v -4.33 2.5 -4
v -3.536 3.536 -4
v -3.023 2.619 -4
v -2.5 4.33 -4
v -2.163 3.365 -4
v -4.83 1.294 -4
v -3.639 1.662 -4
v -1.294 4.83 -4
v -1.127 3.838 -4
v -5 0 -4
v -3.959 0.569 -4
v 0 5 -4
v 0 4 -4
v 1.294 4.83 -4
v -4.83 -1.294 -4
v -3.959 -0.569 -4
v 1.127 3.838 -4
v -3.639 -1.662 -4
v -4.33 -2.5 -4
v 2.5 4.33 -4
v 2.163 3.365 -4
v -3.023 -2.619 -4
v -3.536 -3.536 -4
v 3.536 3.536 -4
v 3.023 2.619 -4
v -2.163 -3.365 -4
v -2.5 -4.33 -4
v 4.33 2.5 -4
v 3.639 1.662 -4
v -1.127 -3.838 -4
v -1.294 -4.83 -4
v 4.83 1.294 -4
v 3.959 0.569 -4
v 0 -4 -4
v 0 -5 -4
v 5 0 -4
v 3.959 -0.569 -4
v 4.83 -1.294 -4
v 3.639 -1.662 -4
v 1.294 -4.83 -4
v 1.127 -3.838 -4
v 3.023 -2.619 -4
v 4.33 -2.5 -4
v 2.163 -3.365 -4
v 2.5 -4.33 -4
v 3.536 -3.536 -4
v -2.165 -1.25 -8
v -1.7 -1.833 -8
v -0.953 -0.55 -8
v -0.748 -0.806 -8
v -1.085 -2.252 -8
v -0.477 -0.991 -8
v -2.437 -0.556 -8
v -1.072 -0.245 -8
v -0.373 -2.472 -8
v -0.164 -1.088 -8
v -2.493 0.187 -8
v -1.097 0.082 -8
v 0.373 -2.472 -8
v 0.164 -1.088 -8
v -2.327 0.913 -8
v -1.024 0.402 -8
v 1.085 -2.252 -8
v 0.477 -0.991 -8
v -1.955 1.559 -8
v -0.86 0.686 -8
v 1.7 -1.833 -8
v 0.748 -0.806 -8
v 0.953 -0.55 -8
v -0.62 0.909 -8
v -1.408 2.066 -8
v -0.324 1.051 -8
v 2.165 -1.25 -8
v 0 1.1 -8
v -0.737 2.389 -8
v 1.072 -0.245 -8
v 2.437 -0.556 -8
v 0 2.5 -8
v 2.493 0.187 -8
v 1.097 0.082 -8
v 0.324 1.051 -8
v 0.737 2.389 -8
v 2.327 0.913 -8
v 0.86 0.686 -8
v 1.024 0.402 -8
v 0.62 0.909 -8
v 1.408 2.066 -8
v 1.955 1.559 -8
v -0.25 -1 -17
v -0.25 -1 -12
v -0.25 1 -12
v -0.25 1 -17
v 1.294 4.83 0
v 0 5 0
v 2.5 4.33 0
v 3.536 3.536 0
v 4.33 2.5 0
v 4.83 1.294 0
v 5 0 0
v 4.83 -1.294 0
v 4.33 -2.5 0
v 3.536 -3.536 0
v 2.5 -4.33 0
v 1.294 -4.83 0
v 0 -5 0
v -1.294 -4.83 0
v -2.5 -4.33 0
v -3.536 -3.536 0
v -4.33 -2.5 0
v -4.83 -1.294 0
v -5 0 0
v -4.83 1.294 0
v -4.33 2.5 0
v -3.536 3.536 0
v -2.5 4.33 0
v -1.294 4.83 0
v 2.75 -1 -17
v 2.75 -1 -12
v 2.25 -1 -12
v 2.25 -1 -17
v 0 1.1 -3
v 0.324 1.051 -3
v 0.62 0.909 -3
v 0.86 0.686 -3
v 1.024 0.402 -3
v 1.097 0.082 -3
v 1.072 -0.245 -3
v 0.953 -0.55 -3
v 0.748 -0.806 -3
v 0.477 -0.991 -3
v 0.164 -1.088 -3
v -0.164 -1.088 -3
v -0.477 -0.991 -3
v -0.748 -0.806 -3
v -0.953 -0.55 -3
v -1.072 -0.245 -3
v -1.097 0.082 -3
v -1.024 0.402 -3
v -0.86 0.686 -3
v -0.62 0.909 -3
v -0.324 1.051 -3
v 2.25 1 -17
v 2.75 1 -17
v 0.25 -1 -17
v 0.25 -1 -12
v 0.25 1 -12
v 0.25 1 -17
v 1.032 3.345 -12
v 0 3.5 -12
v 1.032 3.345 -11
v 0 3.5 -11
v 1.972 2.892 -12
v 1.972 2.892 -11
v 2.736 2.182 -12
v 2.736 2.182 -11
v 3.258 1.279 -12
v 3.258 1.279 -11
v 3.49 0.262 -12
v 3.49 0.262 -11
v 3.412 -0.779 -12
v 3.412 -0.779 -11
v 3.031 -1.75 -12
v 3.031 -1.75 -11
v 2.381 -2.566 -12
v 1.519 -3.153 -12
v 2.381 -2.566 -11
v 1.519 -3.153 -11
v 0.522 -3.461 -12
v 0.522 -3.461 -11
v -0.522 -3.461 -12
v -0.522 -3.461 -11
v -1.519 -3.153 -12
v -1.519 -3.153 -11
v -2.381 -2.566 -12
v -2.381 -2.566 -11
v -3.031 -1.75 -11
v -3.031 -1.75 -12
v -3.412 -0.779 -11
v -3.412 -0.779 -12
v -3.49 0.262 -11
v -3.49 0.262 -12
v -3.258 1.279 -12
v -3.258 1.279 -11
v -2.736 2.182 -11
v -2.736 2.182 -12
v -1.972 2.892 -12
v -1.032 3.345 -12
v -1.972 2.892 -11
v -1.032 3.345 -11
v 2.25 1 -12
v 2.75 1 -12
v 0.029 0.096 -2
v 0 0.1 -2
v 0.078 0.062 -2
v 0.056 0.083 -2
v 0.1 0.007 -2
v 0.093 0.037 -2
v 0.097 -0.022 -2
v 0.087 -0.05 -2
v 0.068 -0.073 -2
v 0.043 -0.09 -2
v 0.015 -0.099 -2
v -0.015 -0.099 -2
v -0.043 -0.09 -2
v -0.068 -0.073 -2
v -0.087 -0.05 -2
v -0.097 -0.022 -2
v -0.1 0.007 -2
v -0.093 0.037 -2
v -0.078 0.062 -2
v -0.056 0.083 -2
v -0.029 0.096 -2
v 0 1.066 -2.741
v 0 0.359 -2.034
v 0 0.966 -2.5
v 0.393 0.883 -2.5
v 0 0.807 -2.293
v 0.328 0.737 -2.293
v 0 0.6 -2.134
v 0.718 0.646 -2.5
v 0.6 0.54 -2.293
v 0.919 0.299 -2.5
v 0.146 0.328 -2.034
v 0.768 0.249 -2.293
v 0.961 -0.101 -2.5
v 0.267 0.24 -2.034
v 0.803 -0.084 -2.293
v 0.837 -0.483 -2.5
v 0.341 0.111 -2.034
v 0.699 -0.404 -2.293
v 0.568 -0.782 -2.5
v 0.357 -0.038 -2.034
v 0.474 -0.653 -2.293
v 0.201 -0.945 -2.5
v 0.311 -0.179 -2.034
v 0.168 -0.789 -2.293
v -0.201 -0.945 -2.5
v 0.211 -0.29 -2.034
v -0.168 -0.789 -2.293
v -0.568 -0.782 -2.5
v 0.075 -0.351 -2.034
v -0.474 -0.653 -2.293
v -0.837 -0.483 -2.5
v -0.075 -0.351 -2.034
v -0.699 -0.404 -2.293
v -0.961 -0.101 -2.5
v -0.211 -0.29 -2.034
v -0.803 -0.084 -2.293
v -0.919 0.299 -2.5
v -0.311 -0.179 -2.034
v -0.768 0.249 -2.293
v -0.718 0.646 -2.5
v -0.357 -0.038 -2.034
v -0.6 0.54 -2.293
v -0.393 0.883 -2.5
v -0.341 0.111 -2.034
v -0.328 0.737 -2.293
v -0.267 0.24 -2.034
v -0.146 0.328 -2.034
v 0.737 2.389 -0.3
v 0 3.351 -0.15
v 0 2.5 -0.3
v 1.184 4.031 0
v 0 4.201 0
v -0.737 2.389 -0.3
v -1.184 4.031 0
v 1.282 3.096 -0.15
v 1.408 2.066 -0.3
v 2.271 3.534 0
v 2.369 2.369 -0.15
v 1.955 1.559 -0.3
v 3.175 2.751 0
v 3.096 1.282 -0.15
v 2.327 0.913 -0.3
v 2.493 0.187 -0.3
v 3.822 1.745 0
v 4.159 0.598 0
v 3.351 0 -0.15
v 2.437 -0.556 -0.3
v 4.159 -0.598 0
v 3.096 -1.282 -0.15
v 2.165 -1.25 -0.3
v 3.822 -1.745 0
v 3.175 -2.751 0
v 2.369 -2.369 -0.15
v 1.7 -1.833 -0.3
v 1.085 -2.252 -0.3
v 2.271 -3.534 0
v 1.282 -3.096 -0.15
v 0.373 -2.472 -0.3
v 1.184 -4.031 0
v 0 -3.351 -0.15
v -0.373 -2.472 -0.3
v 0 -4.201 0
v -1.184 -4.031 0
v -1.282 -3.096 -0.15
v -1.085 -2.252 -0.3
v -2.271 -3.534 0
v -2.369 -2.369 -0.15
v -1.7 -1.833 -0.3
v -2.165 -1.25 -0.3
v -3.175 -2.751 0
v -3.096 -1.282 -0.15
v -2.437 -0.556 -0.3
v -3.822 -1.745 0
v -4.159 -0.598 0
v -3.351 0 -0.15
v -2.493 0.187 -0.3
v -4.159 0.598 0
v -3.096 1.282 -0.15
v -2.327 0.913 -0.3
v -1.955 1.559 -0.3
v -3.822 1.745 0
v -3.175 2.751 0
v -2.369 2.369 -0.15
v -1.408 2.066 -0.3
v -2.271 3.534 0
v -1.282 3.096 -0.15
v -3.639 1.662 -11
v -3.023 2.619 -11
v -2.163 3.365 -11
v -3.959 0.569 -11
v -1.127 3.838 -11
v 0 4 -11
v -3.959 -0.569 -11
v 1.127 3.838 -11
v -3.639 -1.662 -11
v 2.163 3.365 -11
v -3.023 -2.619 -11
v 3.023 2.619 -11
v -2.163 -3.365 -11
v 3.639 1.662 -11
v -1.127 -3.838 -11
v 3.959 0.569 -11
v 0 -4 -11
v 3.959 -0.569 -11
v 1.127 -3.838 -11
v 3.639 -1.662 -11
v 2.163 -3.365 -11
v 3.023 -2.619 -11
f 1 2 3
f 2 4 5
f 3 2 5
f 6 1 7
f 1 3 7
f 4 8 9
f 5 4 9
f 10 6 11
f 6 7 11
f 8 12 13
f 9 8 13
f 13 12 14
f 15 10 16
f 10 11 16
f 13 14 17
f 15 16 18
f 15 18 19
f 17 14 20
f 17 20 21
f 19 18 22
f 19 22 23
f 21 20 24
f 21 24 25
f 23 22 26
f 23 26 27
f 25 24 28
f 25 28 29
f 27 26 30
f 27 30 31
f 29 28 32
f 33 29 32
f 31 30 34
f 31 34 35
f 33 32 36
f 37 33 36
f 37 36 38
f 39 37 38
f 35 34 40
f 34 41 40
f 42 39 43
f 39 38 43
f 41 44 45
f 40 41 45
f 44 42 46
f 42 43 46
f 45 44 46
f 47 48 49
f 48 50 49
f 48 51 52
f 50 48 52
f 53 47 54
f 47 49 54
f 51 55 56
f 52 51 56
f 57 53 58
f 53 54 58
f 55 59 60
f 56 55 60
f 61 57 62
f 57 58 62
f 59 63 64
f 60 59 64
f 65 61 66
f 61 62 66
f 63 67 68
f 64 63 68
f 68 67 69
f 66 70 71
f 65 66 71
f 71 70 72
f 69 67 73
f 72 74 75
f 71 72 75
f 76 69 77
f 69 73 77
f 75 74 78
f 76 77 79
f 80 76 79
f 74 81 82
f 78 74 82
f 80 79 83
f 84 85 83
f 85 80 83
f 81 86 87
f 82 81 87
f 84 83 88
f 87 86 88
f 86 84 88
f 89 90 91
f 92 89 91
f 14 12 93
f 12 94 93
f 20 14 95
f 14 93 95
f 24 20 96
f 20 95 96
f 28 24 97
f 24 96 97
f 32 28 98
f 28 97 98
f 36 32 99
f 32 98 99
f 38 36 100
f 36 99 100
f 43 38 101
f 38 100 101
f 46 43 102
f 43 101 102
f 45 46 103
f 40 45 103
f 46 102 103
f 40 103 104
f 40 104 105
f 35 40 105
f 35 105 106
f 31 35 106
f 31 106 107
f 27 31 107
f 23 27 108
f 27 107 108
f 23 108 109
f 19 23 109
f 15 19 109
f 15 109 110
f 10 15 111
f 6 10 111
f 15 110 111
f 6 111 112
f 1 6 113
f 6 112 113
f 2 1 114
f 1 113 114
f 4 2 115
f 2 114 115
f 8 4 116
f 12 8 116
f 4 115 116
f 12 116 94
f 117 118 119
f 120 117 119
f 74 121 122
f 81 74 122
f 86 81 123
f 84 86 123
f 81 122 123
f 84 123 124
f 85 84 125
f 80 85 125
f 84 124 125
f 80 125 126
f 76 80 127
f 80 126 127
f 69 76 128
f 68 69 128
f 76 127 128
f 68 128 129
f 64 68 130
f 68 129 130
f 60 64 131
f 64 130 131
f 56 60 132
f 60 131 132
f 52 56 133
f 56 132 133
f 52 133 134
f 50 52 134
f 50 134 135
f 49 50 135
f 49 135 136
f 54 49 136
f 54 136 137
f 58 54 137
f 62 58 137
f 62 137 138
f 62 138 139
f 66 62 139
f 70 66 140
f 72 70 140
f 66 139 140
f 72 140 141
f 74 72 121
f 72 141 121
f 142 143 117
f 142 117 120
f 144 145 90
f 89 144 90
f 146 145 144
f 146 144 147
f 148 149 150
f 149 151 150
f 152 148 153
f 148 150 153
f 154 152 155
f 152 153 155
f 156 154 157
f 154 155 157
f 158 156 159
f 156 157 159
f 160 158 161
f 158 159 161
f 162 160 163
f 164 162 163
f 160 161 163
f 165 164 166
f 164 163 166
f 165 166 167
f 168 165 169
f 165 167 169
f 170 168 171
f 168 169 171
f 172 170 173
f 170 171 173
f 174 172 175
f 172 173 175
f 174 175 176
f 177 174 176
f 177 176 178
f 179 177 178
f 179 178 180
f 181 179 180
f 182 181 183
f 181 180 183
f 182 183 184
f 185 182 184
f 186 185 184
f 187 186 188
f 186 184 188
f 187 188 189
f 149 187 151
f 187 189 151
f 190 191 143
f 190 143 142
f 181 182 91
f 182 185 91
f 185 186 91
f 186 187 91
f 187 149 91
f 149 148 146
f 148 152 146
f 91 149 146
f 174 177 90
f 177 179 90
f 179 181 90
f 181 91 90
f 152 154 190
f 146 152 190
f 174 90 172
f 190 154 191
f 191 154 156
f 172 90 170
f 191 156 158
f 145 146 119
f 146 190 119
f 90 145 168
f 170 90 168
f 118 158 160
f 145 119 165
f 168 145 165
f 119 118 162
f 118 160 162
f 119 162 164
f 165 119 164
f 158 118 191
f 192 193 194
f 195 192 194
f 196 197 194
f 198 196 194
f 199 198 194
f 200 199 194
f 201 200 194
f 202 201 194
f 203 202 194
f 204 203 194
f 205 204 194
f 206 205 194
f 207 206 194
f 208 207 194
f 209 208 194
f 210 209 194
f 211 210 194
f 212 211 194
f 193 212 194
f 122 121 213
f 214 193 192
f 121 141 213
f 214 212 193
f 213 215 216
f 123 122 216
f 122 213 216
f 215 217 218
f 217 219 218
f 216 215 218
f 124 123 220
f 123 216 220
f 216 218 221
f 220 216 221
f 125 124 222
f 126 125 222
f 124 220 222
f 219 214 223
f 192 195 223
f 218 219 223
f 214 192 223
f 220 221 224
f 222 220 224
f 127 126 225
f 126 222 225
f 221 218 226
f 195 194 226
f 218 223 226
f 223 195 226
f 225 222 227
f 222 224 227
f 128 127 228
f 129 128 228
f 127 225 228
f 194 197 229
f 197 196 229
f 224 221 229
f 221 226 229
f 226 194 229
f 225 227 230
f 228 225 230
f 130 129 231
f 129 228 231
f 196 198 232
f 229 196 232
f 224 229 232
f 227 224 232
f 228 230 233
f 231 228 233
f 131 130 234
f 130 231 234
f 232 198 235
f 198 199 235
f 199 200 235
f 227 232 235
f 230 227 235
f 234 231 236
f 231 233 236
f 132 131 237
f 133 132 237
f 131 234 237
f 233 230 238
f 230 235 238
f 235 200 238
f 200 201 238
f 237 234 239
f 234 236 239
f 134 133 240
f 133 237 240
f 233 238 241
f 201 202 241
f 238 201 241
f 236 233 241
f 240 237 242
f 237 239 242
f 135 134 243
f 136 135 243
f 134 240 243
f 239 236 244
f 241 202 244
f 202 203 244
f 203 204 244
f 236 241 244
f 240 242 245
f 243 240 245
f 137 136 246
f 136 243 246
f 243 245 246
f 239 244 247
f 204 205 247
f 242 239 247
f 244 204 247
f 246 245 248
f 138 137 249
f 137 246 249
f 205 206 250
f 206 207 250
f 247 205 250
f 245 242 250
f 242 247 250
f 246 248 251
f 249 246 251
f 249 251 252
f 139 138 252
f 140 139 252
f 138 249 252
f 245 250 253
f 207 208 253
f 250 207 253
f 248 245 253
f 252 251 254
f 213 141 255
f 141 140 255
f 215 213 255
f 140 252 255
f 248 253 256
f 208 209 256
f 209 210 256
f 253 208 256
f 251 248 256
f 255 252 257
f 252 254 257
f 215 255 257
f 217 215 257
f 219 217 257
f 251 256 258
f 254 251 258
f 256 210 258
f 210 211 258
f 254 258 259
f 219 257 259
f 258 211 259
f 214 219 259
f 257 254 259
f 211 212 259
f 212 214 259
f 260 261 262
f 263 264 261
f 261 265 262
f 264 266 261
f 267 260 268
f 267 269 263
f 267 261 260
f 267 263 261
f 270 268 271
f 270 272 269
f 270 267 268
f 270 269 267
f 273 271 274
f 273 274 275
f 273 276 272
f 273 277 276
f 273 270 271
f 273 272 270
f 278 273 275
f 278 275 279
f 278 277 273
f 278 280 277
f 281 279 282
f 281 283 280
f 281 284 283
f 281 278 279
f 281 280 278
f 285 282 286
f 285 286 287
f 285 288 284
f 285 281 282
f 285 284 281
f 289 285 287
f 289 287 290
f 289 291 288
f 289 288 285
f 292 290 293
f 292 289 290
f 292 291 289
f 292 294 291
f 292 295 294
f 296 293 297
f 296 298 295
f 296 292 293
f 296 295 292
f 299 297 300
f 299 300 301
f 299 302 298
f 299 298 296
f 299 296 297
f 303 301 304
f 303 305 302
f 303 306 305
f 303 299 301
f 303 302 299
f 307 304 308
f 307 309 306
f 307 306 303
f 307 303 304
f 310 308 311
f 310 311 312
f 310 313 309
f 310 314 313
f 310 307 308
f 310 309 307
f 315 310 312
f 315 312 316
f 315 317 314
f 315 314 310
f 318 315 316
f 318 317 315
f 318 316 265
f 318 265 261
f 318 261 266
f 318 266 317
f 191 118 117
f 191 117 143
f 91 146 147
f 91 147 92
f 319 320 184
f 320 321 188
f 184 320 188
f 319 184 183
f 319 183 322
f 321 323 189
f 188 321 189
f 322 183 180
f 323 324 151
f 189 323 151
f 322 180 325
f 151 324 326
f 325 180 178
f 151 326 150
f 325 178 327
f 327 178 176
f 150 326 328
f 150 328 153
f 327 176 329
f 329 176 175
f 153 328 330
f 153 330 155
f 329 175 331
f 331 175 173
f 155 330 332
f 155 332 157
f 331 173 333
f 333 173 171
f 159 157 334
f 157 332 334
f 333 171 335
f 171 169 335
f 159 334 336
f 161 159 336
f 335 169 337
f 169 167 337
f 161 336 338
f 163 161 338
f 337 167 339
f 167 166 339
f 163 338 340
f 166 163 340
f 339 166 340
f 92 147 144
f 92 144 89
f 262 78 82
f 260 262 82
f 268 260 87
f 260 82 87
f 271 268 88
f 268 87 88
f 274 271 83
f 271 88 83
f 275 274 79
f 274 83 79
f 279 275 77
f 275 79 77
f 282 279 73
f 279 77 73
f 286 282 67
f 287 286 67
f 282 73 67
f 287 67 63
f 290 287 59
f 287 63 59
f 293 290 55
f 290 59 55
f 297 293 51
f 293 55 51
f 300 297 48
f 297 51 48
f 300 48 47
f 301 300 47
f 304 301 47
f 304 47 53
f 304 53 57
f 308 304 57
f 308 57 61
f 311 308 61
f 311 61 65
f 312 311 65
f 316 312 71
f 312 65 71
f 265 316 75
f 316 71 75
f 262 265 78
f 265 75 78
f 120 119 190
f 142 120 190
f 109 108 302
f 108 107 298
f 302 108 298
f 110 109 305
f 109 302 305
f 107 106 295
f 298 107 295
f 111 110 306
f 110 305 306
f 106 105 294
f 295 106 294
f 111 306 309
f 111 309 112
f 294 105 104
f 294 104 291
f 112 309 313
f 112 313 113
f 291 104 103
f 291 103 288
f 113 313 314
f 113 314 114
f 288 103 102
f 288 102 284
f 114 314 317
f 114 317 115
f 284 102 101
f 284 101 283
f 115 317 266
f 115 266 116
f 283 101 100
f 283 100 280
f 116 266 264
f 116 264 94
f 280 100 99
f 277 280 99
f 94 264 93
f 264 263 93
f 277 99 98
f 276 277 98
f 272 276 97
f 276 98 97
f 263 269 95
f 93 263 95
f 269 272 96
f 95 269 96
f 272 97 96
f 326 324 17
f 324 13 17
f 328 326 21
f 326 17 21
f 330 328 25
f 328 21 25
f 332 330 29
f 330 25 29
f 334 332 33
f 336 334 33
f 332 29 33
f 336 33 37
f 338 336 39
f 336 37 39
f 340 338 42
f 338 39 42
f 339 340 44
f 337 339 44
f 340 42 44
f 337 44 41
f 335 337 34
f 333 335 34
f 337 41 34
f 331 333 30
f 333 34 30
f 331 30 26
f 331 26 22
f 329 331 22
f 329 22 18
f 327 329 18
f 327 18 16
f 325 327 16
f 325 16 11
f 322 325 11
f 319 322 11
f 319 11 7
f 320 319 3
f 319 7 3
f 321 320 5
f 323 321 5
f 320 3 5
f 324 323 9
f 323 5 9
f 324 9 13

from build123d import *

# Parameters (mm, degrees)
ZAOKR_GLENIE1_R             = 1
SFAZOWANIE1_SIZE            = 0.3
SFAZOWANIE1_SIZE2           = 1.701384546
SZKIC2_W                    = 0.5
SZKIC2_H                    = 2
DODANIE_WYCI_GNI_CIE1_DEPTH = 5


with BuildPart() as part:
    # Szkic1 → Obrót1 (revolve)
    with BuildSketch(Plane(origin=(0, 0, 0), x_dir=(0, 0, -1), z_dir=(1, 0, 0))):
        Polygon((2, 0), (12, 0), (12, 3.5), (11, 3.5), (11, 4), (4, 4), (4, 5), (0, 5), (0, 2.5), (8, 2.5), (8, 1.1), (2, 1.1), align=None)
    revolve(axis=Axis((0, 0, 23.697784827), (0, 0, -1)))

    # Zaokrąglenie1
    zaokr_glenie1_edges = [part.edges().sort_by_distance(p)[0] for p in [
        (0, -1.1, -2),
    ]]
    fillet(zaokr_glenie1_edges, radius=ZAOKR_GLENIE1_R)

    # Sfazowanie1
    sfazowanie1_edges = [part.edges().sort_by_distance(p)[0] for p in [
        (0, -2.5, 0),
    ]]
    sfazowanie1_side = [part.faces().sort_by_distance(p)[0] for p in [
        (0, -2.5, -4),
    ]]
    chamfer(sfazowanie1_edges, length=SFAZOWANIE1_SIZE, length2=SFAZOWANIE1_SIZE2, reference=sfazowanie1_side[0])

    # Szkic2 → Dodanie-wyciągnięcie1 (add)
    with BuildSketch(Plane(origin=(0, 0, -12), x_dir=(-1, 0, 0), z_dir=(0, 0, -1))):
        with Locations((-2.5, 0)):
            Rectangle(SZKIC2_W, SZKIC2_H)
        Rectangle(SZKIC2_W, SZKIC2_H)
    extrude(amount=DODANIE_WYCI_GNI_CIE1_DEPTH)


solid = part.part
